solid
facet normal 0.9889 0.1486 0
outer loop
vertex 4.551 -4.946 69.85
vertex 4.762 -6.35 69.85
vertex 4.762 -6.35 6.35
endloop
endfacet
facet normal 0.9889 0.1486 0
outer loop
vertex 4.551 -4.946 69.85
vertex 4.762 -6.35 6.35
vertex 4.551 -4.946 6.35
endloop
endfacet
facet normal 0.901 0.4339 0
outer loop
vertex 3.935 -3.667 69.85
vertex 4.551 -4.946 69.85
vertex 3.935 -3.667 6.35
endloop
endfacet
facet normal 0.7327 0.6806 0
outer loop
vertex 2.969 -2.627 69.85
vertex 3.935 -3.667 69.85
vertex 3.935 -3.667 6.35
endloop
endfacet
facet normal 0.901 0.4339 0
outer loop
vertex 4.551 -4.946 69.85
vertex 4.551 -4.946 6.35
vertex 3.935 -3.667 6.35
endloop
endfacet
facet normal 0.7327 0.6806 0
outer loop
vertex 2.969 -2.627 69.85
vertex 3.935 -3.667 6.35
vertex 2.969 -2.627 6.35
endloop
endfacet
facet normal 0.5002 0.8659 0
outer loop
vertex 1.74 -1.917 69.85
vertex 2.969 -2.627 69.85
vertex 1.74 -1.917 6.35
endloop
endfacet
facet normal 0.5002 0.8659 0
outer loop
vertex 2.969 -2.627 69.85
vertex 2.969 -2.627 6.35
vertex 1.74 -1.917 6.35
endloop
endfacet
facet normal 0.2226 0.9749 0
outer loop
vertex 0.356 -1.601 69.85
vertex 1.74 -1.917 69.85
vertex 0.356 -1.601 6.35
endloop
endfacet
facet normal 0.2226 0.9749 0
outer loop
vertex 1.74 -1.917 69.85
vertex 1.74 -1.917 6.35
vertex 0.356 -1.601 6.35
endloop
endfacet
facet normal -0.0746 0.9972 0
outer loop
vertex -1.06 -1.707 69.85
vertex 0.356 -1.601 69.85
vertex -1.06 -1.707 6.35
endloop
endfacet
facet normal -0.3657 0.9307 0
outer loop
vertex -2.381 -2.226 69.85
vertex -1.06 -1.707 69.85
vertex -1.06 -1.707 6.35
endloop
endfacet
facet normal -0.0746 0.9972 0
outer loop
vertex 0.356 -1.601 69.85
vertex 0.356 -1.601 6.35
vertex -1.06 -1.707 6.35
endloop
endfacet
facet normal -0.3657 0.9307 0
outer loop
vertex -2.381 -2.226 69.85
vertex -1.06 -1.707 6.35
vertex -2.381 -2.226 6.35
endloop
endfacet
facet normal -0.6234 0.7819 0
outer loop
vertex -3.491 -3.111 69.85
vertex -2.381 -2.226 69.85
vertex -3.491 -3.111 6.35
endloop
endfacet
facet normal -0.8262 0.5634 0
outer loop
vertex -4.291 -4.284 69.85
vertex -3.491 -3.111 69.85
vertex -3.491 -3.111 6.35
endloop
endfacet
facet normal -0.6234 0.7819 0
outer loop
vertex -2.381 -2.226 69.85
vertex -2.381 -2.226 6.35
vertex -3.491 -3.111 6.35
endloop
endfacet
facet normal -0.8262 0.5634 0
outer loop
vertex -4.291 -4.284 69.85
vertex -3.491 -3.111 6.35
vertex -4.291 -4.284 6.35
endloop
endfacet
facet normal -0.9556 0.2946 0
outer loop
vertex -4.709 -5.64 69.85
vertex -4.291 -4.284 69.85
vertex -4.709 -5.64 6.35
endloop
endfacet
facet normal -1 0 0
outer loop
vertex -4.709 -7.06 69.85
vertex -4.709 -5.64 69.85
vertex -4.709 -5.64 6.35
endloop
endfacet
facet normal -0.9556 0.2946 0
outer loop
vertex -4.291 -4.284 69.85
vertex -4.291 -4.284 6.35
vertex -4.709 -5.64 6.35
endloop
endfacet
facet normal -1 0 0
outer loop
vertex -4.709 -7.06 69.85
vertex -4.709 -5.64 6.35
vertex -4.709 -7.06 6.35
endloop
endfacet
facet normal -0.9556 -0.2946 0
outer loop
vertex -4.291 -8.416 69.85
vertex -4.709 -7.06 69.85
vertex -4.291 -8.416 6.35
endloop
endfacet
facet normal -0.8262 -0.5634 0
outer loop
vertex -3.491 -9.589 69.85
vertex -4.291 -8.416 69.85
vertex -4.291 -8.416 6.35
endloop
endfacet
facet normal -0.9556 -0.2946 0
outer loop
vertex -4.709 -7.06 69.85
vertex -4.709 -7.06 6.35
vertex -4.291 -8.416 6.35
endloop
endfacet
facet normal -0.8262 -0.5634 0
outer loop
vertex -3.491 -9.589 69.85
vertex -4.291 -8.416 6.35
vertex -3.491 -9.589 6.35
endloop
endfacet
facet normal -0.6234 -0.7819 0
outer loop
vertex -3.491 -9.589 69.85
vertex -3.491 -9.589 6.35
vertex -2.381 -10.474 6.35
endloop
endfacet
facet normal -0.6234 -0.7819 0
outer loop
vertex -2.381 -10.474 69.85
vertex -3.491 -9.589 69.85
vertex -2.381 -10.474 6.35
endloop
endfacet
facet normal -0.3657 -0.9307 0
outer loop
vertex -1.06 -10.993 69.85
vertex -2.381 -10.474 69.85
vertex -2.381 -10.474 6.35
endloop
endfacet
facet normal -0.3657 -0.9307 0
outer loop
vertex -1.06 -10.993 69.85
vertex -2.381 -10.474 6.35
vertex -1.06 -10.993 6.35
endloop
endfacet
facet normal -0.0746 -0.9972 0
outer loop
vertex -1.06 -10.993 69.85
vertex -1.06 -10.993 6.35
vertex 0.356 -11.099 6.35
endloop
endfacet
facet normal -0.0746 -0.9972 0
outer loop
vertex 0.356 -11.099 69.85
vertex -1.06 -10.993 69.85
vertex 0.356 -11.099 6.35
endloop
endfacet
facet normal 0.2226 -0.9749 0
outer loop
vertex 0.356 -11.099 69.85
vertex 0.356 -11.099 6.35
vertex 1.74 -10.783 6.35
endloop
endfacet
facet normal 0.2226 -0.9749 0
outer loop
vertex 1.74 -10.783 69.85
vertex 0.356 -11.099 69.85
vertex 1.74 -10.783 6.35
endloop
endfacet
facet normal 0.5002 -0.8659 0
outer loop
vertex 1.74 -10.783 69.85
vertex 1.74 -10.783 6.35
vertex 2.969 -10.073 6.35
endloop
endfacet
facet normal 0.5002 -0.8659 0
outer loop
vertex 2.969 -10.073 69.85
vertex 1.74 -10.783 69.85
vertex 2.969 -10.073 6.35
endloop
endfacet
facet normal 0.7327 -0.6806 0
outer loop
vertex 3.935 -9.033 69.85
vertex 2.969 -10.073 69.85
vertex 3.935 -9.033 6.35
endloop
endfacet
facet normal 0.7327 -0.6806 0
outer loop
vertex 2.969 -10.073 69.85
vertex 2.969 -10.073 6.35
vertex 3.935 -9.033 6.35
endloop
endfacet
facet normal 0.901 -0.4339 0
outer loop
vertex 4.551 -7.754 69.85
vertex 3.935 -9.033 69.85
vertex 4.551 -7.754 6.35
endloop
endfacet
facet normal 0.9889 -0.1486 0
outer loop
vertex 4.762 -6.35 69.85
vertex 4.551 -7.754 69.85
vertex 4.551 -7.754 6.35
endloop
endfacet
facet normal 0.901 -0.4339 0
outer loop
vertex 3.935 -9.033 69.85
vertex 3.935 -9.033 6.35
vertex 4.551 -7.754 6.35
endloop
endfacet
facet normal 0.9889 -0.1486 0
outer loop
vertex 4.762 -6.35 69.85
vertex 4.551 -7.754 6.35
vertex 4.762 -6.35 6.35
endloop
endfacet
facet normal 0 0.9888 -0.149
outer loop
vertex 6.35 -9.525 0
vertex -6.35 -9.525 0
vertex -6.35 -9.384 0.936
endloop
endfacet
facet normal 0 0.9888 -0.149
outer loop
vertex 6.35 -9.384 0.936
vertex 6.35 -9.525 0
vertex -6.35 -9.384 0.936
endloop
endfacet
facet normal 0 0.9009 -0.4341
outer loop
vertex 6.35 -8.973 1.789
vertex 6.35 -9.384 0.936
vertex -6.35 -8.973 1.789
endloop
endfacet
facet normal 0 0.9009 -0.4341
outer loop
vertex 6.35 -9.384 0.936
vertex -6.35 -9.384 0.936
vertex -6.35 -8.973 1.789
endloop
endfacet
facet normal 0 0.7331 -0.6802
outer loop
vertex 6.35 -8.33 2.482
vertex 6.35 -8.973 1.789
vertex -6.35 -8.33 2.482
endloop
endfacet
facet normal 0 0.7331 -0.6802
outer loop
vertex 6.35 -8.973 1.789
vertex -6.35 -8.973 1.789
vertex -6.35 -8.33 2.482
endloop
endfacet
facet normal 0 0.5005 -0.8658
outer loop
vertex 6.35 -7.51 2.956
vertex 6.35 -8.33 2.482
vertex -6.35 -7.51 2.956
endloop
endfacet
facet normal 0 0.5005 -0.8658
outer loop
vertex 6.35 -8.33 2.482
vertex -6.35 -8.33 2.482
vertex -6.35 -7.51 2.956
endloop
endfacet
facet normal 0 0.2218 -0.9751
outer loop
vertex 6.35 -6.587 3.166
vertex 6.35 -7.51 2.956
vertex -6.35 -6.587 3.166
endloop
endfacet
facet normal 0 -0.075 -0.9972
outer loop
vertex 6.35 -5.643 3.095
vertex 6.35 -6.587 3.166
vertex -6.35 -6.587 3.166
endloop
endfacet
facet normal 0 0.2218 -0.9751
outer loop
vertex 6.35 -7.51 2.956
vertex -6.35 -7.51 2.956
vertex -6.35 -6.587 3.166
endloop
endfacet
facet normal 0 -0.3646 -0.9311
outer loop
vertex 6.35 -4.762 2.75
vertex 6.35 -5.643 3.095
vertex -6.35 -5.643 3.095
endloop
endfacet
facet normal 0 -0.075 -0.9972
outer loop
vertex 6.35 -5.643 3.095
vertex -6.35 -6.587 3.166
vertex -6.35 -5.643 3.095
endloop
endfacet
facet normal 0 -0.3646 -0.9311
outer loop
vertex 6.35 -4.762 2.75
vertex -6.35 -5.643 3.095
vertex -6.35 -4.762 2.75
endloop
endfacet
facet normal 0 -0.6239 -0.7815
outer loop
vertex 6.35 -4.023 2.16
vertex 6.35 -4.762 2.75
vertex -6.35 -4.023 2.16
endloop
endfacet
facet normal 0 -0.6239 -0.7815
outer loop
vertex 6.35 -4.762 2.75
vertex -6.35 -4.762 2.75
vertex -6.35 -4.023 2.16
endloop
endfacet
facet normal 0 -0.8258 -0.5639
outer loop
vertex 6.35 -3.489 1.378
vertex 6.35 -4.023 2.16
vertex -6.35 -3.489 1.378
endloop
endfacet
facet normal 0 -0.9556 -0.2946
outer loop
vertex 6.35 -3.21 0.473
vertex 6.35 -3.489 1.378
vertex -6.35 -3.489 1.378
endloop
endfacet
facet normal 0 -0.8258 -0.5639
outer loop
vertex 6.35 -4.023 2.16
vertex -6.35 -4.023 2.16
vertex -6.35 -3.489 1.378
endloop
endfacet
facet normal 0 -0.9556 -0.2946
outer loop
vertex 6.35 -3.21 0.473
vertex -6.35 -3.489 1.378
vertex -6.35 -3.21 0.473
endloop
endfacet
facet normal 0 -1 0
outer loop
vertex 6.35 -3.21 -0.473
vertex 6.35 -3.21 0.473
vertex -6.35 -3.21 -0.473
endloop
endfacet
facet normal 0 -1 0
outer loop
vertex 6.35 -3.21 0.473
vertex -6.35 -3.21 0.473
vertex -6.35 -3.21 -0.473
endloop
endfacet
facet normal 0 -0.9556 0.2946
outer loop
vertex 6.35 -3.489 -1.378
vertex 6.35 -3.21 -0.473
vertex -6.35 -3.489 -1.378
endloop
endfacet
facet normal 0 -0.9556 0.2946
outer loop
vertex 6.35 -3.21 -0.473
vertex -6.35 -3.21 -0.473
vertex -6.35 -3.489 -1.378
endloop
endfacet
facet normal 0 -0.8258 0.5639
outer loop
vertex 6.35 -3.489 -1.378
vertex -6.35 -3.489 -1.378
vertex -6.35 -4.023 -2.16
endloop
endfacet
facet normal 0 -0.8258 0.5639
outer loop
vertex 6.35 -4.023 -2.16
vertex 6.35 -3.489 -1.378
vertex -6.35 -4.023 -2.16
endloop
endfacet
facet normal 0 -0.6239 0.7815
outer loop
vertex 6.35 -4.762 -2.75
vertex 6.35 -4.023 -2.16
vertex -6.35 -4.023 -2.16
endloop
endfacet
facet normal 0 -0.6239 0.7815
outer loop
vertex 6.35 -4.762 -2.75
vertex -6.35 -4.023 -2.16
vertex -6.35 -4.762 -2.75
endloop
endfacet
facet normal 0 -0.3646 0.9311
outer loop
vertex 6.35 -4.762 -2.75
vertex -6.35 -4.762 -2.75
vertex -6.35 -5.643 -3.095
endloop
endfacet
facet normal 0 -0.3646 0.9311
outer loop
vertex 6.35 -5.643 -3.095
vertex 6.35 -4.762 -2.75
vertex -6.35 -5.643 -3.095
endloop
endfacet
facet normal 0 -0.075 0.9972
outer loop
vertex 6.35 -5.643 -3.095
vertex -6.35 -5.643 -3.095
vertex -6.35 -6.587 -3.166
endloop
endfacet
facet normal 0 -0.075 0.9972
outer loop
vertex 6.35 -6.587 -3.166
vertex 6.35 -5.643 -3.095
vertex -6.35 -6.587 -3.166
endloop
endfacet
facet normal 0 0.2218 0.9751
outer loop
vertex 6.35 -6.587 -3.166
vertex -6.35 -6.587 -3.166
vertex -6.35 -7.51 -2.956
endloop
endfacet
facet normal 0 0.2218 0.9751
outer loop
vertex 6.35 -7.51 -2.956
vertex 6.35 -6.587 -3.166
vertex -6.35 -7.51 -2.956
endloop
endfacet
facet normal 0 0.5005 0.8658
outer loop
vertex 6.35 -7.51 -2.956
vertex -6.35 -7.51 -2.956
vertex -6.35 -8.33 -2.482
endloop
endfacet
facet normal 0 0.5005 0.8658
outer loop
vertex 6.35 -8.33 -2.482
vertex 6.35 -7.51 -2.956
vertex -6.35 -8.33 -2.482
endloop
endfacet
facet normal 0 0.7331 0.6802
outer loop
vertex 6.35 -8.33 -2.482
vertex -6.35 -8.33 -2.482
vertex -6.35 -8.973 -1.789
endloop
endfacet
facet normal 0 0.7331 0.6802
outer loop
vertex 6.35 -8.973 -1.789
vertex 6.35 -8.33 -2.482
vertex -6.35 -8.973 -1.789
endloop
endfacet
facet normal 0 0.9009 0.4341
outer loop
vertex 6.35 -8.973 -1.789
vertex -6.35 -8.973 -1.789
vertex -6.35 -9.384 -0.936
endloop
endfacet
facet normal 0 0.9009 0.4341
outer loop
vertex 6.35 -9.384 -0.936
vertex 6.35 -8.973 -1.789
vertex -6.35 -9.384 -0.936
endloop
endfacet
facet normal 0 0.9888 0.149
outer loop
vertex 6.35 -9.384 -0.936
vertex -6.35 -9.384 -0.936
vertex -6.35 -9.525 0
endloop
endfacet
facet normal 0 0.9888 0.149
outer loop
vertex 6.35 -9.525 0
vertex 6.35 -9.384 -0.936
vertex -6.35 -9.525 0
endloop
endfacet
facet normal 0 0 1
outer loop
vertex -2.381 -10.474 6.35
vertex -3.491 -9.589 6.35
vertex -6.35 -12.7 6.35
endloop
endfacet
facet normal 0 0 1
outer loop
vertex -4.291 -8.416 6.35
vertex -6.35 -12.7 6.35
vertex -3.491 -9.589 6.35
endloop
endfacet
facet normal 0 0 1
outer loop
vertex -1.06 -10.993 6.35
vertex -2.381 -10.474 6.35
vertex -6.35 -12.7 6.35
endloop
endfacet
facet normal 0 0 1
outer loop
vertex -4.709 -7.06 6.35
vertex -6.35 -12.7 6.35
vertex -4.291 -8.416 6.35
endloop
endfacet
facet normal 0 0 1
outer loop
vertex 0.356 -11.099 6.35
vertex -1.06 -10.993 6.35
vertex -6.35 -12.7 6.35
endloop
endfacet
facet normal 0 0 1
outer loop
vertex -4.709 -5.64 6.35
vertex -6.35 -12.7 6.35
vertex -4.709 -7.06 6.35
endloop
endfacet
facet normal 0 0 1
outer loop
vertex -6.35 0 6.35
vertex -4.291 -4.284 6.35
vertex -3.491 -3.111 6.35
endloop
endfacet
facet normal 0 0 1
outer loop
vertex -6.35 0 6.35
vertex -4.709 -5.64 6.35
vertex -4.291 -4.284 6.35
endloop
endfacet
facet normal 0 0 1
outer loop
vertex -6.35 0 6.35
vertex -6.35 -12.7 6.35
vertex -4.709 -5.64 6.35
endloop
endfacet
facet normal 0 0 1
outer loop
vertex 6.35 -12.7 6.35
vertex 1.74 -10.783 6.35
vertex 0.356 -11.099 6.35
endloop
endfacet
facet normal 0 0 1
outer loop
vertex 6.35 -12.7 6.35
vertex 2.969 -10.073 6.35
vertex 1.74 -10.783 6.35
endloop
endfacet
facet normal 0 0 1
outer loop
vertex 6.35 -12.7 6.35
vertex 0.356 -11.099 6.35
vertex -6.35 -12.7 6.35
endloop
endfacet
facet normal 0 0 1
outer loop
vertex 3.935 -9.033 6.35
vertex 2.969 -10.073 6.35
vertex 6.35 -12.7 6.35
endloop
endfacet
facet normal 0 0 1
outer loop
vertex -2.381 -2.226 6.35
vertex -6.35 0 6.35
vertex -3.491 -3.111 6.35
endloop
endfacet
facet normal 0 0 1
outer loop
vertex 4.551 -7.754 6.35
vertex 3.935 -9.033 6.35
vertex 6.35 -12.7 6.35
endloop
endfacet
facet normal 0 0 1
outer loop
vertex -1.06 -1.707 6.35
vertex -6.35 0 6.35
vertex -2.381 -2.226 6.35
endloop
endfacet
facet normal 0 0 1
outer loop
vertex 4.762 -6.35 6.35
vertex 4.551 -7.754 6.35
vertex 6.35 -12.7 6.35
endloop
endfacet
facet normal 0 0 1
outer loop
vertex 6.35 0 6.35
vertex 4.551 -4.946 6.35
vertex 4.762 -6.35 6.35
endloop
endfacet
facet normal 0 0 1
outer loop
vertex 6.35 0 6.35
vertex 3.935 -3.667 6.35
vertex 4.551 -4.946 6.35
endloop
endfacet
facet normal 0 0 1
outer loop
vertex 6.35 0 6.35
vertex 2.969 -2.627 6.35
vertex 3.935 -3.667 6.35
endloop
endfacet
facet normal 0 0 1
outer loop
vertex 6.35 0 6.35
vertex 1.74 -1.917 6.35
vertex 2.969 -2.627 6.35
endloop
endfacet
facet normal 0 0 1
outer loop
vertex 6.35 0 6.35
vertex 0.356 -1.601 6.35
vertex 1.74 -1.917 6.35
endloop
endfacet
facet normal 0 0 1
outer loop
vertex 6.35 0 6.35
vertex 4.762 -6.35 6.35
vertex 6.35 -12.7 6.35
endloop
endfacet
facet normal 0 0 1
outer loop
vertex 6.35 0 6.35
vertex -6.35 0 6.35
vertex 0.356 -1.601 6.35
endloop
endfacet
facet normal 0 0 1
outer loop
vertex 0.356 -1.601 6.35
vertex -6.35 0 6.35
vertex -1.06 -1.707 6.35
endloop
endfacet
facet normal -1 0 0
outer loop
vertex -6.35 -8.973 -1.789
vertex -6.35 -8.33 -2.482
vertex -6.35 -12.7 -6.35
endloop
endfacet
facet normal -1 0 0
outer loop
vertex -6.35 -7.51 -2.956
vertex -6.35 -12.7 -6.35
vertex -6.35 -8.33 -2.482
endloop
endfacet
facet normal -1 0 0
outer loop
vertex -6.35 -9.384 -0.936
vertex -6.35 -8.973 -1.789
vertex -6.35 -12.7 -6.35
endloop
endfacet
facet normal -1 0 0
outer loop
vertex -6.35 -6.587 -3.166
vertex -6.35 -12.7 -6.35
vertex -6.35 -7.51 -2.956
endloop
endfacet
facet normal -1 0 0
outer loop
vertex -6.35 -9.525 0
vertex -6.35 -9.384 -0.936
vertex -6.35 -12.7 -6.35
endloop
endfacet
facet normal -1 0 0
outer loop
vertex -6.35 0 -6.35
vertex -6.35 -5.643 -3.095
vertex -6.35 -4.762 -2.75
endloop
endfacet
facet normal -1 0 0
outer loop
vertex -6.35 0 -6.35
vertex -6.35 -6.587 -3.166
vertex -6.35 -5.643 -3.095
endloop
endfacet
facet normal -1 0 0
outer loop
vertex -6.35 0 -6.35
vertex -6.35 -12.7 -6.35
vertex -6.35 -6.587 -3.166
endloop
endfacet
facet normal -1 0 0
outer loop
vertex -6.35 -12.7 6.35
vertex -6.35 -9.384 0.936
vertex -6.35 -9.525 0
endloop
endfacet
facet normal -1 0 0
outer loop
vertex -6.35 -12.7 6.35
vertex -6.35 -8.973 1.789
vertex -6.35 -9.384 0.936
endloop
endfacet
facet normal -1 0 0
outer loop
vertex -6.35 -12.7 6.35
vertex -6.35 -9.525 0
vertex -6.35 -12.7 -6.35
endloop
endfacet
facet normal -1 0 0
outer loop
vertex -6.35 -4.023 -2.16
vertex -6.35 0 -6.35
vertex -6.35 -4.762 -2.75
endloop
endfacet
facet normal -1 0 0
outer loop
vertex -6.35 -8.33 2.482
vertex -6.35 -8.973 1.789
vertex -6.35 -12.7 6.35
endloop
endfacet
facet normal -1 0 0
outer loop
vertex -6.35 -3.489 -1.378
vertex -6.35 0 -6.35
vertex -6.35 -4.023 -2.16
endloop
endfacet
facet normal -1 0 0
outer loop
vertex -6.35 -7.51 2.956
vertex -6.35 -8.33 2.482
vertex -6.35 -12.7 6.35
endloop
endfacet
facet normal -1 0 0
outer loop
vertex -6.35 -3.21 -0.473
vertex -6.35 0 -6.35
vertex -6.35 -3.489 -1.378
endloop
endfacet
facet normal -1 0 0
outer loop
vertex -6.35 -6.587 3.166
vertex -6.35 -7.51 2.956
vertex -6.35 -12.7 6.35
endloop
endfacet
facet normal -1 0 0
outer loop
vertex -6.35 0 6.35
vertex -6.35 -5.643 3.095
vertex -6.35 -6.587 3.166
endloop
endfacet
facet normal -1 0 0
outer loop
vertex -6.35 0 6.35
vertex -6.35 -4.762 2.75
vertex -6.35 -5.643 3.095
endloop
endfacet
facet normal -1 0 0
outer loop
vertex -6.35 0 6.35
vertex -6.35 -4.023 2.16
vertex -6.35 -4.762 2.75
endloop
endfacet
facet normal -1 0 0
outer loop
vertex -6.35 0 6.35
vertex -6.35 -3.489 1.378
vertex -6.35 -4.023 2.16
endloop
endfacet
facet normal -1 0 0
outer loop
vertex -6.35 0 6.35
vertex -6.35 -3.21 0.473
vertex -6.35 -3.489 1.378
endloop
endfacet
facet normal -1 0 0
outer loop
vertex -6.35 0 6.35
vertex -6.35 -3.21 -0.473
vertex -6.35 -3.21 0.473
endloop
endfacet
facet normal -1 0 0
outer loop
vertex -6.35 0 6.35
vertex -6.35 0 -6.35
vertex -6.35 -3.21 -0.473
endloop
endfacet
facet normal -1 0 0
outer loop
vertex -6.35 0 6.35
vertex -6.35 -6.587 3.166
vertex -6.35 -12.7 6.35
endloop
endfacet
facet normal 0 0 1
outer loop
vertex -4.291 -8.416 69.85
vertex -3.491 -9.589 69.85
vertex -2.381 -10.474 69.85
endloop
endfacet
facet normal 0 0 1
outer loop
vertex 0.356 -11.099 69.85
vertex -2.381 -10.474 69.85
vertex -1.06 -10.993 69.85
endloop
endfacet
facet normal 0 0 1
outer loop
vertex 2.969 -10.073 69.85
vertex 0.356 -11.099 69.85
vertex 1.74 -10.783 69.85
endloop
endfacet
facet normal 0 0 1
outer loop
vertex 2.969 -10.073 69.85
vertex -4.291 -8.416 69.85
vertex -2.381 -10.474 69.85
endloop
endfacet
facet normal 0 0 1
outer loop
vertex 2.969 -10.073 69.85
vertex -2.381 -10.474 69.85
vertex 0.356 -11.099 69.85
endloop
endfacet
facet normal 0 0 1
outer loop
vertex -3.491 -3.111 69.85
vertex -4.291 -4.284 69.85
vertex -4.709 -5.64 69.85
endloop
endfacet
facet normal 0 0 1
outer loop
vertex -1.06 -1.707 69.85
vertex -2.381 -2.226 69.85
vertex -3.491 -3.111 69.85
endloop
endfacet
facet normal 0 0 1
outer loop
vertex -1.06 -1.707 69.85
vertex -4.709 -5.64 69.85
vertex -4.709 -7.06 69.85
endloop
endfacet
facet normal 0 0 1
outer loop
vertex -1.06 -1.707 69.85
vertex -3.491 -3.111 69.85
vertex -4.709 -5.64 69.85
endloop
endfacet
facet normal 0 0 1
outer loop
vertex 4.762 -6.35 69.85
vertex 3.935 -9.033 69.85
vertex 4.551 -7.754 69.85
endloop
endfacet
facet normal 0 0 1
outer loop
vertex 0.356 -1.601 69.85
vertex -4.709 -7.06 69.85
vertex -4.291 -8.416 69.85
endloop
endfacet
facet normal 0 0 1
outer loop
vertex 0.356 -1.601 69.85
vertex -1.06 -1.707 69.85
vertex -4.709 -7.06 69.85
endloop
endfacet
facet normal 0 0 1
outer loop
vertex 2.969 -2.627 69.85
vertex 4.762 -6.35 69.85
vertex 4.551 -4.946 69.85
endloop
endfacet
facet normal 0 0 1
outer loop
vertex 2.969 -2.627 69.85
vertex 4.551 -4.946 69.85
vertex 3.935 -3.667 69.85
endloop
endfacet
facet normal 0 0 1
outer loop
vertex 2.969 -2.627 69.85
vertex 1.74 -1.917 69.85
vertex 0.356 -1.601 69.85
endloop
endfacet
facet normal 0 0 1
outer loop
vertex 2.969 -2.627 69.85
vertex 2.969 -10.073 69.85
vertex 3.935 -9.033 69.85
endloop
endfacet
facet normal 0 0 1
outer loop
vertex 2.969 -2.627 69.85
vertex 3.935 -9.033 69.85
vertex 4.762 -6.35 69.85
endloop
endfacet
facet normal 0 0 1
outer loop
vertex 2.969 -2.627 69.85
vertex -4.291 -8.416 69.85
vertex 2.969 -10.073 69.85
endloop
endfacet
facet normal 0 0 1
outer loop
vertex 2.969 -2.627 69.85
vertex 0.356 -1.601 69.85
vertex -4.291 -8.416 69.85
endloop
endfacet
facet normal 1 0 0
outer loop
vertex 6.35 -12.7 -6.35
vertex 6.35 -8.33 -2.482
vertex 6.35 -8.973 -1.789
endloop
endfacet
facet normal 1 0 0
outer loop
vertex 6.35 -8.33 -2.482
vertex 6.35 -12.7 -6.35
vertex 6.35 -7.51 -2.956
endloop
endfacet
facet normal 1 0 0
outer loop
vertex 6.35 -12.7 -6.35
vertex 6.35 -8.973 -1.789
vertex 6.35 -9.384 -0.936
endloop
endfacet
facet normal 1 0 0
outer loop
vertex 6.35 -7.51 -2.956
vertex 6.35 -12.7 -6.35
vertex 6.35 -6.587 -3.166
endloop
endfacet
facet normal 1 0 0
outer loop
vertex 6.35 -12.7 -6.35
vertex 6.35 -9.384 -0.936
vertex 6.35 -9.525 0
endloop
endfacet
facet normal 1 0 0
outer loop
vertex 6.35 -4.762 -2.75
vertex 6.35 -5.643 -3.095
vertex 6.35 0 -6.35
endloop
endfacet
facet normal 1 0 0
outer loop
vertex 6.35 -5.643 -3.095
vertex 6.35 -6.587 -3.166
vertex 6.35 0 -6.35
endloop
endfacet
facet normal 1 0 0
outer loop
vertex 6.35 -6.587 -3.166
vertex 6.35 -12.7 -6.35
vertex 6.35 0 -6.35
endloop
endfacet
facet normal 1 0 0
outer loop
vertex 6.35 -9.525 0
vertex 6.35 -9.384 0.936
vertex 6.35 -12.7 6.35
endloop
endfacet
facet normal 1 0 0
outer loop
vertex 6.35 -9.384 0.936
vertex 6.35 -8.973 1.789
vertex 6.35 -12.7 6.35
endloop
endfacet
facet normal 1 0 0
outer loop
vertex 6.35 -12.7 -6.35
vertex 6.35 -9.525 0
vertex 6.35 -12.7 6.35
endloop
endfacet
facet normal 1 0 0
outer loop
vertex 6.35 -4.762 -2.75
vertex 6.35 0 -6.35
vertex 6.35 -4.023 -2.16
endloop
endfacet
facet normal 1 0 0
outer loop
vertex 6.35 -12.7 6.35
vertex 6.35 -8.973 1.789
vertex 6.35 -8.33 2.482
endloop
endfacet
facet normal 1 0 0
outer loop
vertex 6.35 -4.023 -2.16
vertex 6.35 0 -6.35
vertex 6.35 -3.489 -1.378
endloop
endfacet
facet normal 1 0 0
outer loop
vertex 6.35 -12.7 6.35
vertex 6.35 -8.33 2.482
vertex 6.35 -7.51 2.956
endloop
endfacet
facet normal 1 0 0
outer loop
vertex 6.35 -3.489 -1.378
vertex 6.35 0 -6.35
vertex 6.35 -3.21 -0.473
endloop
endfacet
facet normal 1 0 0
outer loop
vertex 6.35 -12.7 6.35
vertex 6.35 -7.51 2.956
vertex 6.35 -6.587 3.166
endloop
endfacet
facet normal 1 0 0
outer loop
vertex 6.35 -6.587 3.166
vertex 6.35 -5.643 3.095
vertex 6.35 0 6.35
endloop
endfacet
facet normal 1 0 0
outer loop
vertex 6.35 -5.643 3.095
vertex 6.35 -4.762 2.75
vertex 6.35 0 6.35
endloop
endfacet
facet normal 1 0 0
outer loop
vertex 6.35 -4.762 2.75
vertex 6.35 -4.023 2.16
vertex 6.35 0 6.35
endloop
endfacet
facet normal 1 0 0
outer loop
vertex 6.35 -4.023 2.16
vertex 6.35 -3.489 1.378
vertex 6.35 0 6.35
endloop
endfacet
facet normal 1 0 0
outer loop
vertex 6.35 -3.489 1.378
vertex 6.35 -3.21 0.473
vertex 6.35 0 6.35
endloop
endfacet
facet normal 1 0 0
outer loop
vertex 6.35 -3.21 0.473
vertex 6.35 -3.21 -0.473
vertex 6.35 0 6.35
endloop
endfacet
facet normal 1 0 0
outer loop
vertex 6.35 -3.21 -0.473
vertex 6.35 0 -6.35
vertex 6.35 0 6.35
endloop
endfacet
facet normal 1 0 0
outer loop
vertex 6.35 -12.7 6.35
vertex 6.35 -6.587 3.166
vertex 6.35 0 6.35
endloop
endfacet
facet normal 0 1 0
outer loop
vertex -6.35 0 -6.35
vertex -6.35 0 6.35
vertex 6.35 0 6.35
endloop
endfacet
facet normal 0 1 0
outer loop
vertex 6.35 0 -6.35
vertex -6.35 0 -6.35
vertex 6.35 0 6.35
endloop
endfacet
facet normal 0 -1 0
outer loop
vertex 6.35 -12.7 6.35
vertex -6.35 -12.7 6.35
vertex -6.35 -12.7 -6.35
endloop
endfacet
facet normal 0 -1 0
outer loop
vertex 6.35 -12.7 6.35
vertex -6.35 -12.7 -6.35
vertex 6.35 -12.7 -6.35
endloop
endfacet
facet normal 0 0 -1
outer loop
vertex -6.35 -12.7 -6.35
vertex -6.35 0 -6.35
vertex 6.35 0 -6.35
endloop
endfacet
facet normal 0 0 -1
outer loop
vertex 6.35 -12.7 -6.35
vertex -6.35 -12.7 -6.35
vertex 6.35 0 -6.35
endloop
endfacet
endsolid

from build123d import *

# Parameters (mm, degrees)
F0_W     = 12.7
F0_H     = 12.7
F1_DEPTH = 12.7
F2_R     = 4.7625
F3_DEPTH = 63.5
F4_R     = 3.175
F5_DEPTH = 12.701


with BuildPart() as f1:
    # F0 (on Front) → F1 (new body)
    with BuildSketch(Plane.XZ):
        Rectangle(F0_W, F0_H)
    extrude(amount=F1_DEPTH)

    # F2 (on face) → F3 (join)
    with BuildSketch(Plane.XY.offset(6.35)):
        with Locations((0, -6.35)):
            Circle(F2_R)
    extrude(amount=F3_DEPTH)

    # F4 (on face) → F5 (cut, through all)
    with BuildSketch(Plane(origin=(-6.35, 0, 0), x_dir=(0, -1, 0), z_dir=(-1, 0, 0))):
        with Locations((6.35, 0)):
            Circle(F4_R)
    extrude(amount=-F5_DEPTH, mode=Mode.SUBTRACT)


solid = f1.part
